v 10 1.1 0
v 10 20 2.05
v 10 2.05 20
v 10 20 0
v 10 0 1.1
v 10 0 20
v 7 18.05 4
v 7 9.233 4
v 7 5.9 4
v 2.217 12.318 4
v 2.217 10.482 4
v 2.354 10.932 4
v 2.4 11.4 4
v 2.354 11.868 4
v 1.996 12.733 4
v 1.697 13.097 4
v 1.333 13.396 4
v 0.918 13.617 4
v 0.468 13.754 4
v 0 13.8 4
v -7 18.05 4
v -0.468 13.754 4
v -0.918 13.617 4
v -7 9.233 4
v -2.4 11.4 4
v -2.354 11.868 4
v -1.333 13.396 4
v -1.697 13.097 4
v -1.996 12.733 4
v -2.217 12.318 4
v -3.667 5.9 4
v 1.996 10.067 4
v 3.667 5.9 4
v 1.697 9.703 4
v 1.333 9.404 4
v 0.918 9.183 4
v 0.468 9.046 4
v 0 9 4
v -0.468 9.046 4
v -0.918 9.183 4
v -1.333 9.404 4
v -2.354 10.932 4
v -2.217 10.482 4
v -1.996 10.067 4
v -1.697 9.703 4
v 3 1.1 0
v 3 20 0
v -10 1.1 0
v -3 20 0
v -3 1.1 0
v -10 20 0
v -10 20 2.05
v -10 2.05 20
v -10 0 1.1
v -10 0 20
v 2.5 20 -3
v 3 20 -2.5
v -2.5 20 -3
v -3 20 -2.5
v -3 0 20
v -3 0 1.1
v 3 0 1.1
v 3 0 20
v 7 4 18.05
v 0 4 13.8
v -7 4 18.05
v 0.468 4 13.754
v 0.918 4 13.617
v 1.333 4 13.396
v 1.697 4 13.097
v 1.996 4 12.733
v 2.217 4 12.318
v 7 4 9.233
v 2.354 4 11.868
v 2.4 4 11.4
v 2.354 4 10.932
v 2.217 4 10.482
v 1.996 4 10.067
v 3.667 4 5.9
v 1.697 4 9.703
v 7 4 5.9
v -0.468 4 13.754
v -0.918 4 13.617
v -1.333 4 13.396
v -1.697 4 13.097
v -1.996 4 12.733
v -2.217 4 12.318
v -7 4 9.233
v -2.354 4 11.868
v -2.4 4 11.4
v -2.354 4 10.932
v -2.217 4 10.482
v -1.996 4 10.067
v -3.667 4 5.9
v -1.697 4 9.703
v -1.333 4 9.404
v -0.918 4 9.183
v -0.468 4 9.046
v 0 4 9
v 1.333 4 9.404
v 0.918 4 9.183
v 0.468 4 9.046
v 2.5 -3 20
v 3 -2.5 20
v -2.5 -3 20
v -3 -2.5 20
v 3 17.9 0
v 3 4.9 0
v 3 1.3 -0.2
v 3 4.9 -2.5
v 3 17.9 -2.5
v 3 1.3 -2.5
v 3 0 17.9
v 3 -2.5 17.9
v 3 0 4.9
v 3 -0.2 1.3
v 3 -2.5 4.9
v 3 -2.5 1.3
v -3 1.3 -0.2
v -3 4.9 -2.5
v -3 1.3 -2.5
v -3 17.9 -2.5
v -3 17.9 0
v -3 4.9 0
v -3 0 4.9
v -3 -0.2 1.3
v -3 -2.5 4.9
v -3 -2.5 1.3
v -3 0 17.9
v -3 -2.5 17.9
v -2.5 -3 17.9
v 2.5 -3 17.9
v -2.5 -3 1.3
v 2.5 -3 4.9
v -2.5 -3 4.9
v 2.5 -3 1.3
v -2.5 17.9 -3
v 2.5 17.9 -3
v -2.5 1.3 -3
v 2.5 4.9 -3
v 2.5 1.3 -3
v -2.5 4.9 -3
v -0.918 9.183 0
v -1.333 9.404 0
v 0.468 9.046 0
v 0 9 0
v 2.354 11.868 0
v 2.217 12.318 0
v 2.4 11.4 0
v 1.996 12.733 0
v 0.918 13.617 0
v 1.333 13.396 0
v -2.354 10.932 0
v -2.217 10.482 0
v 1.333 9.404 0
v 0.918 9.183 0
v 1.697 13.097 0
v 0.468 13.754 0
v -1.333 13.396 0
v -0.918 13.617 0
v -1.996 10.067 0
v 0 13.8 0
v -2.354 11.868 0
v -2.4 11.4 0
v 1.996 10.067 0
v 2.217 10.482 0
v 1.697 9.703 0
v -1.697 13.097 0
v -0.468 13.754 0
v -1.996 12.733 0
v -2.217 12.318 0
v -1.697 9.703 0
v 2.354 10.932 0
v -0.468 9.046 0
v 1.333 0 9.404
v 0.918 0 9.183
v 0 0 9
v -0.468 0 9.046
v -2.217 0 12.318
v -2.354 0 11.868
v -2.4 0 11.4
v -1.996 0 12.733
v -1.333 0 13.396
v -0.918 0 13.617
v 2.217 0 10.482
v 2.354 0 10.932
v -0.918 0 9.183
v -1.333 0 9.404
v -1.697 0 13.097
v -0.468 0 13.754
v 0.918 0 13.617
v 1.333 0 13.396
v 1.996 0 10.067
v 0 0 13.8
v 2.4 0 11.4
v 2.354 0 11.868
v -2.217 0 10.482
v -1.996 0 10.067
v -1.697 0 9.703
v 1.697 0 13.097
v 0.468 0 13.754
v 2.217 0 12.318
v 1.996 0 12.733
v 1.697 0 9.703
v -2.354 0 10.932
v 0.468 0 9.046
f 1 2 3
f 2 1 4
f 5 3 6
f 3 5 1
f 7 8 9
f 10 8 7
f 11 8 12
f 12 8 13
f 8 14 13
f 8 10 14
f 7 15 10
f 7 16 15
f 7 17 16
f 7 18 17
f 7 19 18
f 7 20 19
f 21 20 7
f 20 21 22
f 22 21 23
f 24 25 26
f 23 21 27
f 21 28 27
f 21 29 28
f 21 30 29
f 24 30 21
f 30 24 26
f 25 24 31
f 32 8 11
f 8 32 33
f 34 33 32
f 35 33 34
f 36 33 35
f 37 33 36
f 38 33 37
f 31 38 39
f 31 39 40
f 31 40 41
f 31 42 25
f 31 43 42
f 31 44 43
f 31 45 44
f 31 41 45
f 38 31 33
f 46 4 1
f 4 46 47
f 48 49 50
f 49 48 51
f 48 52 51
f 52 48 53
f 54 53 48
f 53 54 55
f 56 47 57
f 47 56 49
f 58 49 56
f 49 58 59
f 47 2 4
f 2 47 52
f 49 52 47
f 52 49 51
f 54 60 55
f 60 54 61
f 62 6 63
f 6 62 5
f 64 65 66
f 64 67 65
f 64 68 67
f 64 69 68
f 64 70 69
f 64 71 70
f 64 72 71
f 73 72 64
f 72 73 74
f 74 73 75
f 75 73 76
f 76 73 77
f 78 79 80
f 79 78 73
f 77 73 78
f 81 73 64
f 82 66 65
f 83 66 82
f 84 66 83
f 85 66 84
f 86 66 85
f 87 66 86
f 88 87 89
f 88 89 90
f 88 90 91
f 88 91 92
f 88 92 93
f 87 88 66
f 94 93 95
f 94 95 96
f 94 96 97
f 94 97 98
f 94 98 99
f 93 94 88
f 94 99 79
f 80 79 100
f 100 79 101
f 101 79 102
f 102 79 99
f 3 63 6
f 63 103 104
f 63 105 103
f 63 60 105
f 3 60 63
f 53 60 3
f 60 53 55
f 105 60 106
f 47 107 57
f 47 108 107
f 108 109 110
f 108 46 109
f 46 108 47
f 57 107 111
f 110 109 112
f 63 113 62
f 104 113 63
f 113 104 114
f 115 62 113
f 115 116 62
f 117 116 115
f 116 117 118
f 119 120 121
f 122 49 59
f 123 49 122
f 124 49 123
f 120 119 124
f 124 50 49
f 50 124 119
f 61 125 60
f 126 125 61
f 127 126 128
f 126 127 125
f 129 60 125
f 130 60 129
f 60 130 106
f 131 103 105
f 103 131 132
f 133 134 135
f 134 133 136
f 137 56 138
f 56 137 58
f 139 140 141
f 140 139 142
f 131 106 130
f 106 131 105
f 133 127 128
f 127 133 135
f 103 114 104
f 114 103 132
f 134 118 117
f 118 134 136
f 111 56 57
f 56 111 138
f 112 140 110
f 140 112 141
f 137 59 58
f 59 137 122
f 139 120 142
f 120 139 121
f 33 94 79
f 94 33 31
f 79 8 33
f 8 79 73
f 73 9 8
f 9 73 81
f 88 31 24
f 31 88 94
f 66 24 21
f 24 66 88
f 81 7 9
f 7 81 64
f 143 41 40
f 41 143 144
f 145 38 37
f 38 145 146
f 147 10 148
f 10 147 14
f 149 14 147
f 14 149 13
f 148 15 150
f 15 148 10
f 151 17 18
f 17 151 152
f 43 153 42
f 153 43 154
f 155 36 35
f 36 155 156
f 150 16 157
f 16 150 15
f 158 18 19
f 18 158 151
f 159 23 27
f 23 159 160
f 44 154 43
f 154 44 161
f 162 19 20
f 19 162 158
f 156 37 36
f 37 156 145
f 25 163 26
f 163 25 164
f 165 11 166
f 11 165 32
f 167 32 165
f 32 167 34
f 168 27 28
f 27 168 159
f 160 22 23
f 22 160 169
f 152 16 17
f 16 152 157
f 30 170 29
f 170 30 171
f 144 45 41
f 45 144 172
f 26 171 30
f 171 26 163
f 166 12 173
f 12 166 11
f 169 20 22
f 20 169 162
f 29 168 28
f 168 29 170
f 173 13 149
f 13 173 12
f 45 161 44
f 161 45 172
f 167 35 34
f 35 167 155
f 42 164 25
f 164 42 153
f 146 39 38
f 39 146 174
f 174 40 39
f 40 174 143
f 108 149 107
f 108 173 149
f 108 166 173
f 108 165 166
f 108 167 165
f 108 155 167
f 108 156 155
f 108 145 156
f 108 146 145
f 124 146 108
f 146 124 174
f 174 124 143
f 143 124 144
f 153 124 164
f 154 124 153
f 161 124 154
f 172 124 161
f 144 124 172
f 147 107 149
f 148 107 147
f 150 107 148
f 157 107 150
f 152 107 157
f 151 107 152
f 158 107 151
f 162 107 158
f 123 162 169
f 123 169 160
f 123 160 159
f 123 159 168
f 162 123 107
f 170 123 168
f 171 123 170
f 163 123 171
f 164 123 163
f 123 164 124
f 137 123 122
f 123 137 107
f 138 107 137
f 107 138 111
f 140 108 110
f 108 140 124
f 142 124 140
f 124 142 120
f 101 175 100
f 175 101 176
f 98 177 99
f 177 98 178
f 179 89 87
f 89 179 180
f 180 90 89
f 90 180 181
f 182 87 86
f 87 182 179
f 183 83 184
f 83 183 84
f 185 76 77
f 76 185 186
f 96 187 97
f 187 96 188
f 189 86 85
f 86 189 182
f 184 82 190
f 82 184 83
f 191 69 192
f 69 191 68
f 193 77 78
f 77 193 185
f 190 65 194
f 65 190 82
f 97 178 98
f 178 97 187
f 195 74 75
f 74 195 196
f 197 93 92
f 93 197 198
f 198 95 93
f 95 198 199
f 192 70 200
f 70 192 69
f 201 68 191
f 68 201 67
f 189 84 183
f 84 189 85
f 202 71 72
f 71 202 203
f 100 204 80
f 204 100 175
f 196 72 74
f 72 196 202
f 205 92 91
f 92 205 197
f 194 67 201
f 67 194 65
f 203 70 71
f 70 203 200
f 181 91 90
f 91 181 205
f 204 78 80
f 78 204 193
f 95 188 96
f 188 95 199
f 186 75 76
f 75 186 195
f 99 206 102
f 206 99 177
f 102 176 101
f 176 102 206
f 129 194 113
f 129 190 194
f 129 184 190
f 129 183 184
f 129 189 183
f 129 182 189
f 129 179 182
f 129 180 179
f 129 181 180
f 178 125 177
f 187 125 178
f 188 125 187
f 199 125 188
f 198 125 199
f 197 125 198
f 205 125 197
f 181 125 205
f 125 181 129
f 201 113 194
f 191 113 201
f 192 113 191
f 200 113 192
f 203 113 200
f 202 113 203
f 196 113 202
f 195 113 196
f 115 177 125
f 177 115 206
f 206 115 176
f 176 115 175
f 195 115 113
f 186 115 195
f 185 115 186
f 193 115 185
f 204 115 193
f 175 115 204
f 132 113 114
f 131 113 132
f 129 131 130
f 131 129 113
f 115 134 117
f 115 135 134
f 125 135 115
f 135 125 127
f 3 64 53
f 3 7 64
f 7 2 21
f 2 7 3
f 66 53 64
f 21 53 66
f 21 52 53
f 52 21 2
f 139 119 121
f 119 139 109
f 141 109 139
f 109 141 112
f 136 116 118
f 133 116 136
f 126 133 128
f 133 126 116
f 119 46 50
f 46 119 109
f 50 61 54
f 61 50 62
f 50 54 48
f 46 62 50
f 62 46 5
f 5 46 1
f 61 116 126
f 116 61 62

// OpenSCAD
/*
* Ultimate Customizable Corner Brackets
* https://www.thingiverse.com/thing:3007147
* By Daniel Hultgren https://www.thingiverse.com/Hultis
* Version 1.4
* 2020-06-08
*/

/* [Basic settings] */

// The width of your aluminium extrusion.
extrusion_width = 20;
// The side length of the bracket.
side_length = 20;
// The thickness of the wall facing the extrusion.
side_thickness = 4;
// How many screw holes are are on the top side.
top_screw_count = 1;
// How many screw holes are are on the bottom side.
bottom_screw_count = 1;
// Screw diameter (4 for M4, 5 for M5 and so on).
screw_hole_size = 4;
// Screw head diameter.
screw_head_size = 10;


/* [Advanced settings] */

// How deep screw heads should be recessed. Obviously don't make this larger than side_thickness.
recessed_screw_depth = 0;
// How much to elongate the holes on top.
top_screw_elongation = 0;
// How much to elongate the holes on bottom.
bottom_screw_elongation = 0;
// The part which goes into your extrusion. Generally this should be slightly smaller than the actual hole, but YMMV.
extrusion_insert_width = 6;
// Use this when you want multiple connected brackets, for 4020 and similar. 20 for 2020 extrusions, 30 for 3030 and so on.
extrusion_base = 20;
// Set how many walls you want. One wall doesn't play well with multiple bracket mode.
wall_count = 2; // [0 : 1 : 2]
// Set lower if you think the side walls are too thick.
max_wall_thickness = 3;
// Set this if you want to use these above your existing brackets. Typical 2020 brackets have a size of 20 and side thickness of 3.
cutout_size = 1;
cutout_side_thickness = -0.5;
// Decrease this if you don't want extrusion inserts on both sides. Intended for using these entirely or partially on non-extrusions.
extrusion_insert_count = 2; // [0 : 1 : 2]
// Set this to control how much space the nuts have. Hammer nuts should just work but for t nuts you will need to set a specific width.
specific_bottom_nut_space = 13;
// Bracket angle for all your non-90 degree needs.
bracket_angle = 90; // [45 : 1 : 180]





/**********************************
   End of config, here be dragons
**********************************/





/* [Hidden] */
// preview[view:north east, tilt:top diagonal]

// How far into the extrusions the inserts go. Should be fine as it is.
extrusion_insert_height = 3;

cutout_margin = 0.3;
screw_head_margin = 0.5;
e = 0.05;
top_screw_distance = screw_distance_from_edge(side_length, side_thickness, top_screw_count, screw_hole_size, screw_head_size, screw_head_margin, top_screw_elongation, cutout_size);
bottom_screw_distance = screw_distance_from_edge(side_length, side_thickness, bottom_screw_count, screw_hole_size, screw_head_size, screw_head_margin, top_screw_elongation, cutout_size);
screw_distance_from_edge = max(top_screw_distance, bottom_screw_distance);

bridge_size = min(
    bridge(side_length, side_thickness, top_screw_count, screw_head_margin, top_screw_elongation+screw_head_size, top_screw_distance, cutout_size),
    bridge(side_length, side_thickness, bottom_screw_count, screw_head_margin, bottom_screw_elongation+screw_head_size, bottom_screw_distance, cutout_size));

main();

module main() {
    bracket_count = round(extrusion_width / extrusion_base);
    extrusion_width = extrusion_width/bracket_count;
    wall_thickness = min([max_wall_thickness, (extrusion_width - screw_head_size - screw_head_margin) / 2]);
    union() {
        for(i=[0:bracket_count-1]) {
            translate([i*extrusion_width, 0, 0]) bracket(extrusion_width, wall_thickness);
        }
    }
}

module bracket_sides(width) {
    difference() {
        union() {
            translate([-width/2, 0, 0]) cube([width, side_length, side_thickness]); // Bottom wall
            rotate([bracket_angle, 0, 0]) translate([-width/2, 0, -side_thickness]) cube([width, side_length, side_thickness]); // Top wall
        }
        if (bracket_angle < 90) {
            translate([-width/2-e, 0, -side_thickness]) cube([width+2*e, side_length, side_thickness]); // Bottom wall cutoff
            rotate([bracket_angle, 0, 0]) translate([-width/2-e, 0, 0]) cube([width+2*e, side_length, side_thickness]); // Top wall cutoff
        }
    }
}

module bracket(width, wall_thickness, is_first) {
    difference() {
        union() {
            bracket_sides(width);
            if (wall_count >= 1) {
                translate([width/2 - wall_thickness, 0, 0]) rotate([90, 0, 90]) wall(width, side_length, wall_thickness); // Left wall
            }
            if (wall_count >= 2) {
                translate([-width/2, 0, 0]) rotate([90, 0, 90]) wall(width, side_length, wall_thickness); // Right wall
            }
            
            // Make the parts which go into the extrusions, with chamfers
            if (extrusion_insert_count > 0) difference() {
                union() {
                    if (extrusion_insert_count > 0) {
                        translate([0, 0, 0]) rotate([90, 0, 180]) extrusion_insert();
                    }
                    if (extrusion_insert_count > 1) {
                        rotate([bracket_angle-90,0,0]) extrusion_insert();
                        extrusion_insert_corner();
                    }
                    
                }
                // Make chamfers
                rotate([bracket_angle-90,0,0]) extrusion_chamfer();
                translate([0, 0, 0]) rotate([90, 0, 180]) extrusion_chamfer();
            }
            bridge(bridge_size, width, wall_thickness);
        };

        // Cutoff for easier printing
        cutoff_amount = 0.5*(180-bracket_angle)/90 * side_thickness;
        magic_height_number = 42;
        translate([0, side_length+e, side_thickness-cutoff_amount])
            rotate([90-(180-bracket_angle)/2, 0, 0])
            linear_extrude(height=(side_length+e)*2, convexity=2)
            polygon(points = [
                [width/2+e, 0],
                [-width/2-e, 0],
                [-width/2-e, magic_height_number],
                [width/2+e, magic_height_number]
            ]);
        
        // Make screw holes
        side_screw_holes(bottom_screw_count, bottom_screw_distance, bottom_screw_elongation); // Bottom screws
        rotate([bracket_angle-90,0,0]) {
            rotate([270, 180, 0]) side_screw_holes(top_screw_count, top_screw_distance, top_screw_elongation); // Top screws
        }
        cutout();
    }
}

module side_screw_holes(screw_count, screw_distance_from_edge, screw_elongation, screw_distance) {
    screw_total_distance = side_length - screw_distance_from_edge - bridge_size - side_thickness - screw_head_size/2 - screw_head_margin - screw_elongation/2;
    screw_distance = screw_total_distance/(max(1, screw_count-1));
    for(i=[0:screw_count-1]) {
        translate([0, side_length - screw_distance_from_edge - i*screw_distance, -e]) screw(screw_hole_size, screw_head_size, screw_elongation);
    }
}

module cutout() {
    zero = -e-extrusion_insert_height;
    full_width = cutout_size+cutout_margin;
    if (cutout_size > 0) {
        assert(bracket_angle == 90, "Can't use cutout with bracket angles other than 90 degrees");
        translate([extrusion_width/2+e, 0, 0])
            rotate([0, -90, 0])
            linear_extrude(height = extrusion_width+2*e, convexity = 2)
            polygon(points = [
            [zero, zero],
            [zero, full_width],
            [cutout_side_thickness+cutout_margin, full_width],
            [full_width, cutout_side_thickness+cutout_margin],
            [full_width, zero]]);
    }
}

module wall(w, l, wall_thickness) {
    linear_extrude(height = wall_thickness, convexity = 2)
        polygon(points = [[side_thickness*tan((180-bracket_angle)/2), side_thickness],
                          [side_length, side_thickness],
                          [-side_length*sin(bracket_angle-90)+side_thickness*cos(bracket_angle-90), side_length*cos(bracket_angle-90)+side_thickness*sin(bracket_angle-90)]]);
    }

module screw(hole_size, head_size, screw_elongation = 0) {
    if (screw_elongation > 0) {
        translate([0,screw_elongation/2,-0.5]) cylinder(h = side_thickness + 1, r = hole_size / 2 + 0.4, $fn = 32); // Screw hole
        translate([-hole_size/2-0.4,-screw_elongation/2,-0.5]) cube([hole_size + 0.8, screw_elongation, side_thickness + 1]); // Hole mid part
        translate([0,-screw_elongation/2,-0.5]) cylinder(h = side_thickness + 1, r = hole_size / 2 + 0.4, $fn = 32); // Screw hole
    } else {
        translate([0,0,-0.5]) cylinder(h = side_thickness + 1, r = hole_size / 2 + 0.4, $fn = 32); // Screw hole
    }
    if(recessed_screw_depth > 0) {
        assert(screw_elongation == 0, "Can't use recessed screws with elongated screws");
        translate([0, 0, side_thickness - recessed_screw_depth]) cylinder(h = recessed_screw_depth+1, r = (head_size + screw_head_margin)/2, $fn = 32);
    }
    bottom_nut_space = specific_bottom_nut_space > 0
        ? specific_bottom_nut_space
        : max(screw_hole_size*2+1, screw_hole_size+screw_elongation+1); // This works for typical hammer nuts
    translate([-extrusion_insert_width/2-e, -bottom_nut_space/2, -extrusion_insert_height-e]) cube([extrusion_insert_width + 2*e, bottom_nut_space,extrusion_insert_height+2*e]); // Remove extrusion insert below screw
    translate([0, 0, side_thickness+2*e]) display_screw_head(head_size, screw_elongation);
}

module display_screw_head(head_size, screw_elongation) {
    // Screw head, to make sure they don't hit each other
    #hull() {
        translate([0, screw_elongation/2, 0]) cylinder(h = 3, r = head_size / 2, $fn = 32);
        translate([0, -screw_elongation/2, 0]) cylinder(h = 3, r = head_size / 2, $fn = 32);
    }
}

module bridge(size, width, wall_thickness) {
    c = screw_head_size / 3;
    union() {
        translate([width/2, 0, 0])
            rotate([0, 270, 0])
            linear_extrude(height = width, convexity = 2)
             polygon([[side_thickness, side_thickness*tan((180-bracket_angle)/2)],
                       [(side_thickness+size)*cos(bracket_angle-90)+side_thickness*sin(bracket_angle-90), -(side_thickness+size)*sin(bracket_angle-90)+side_thickness*cos(bracket_angle-90)],
                       [side_thickness, side_thickness + size]]); // Main bridge
        if (wall_count >= 1) {
            translate([width/2-wall_thickness-c, 0, 0]) bridge_side(size, [[0, 0], [c, 0], [c, c]]); // Left
        }
        if (wall_count >= 2) {
            translate([-width/2+wall_thickness, 0, 0]) bridge_side(size, [[0, 0], [c, 0], [0, c]]); // Right
        }
    }
}

module bridge_side(size, polygon_points){
    hull() {
        translate([0, size+side_thickness, side_thickness-e]) linear_extrude(height = e, convexity = 2) polygon(points = polygon_points);
        translate([0, -(side_thickness+size)*sin(bracket_angle-90)+side_thickness*cos(bracket_angle-90), (side_thickness+size)*cos(bracket_angle-90)+side_thickness*sin(bracket_angle-90)])
            rotate([bracket_angle,0,0])
                linear_extrude(height = e, convexity = 2)
                    polygon(points = polygon_points);
    }
}

module extrusion_insert() {
    translate([-extrusion_insert_width/2, -extrusion_insert_height, 0]) cube([extrusion_insert_width, extrusion_insert_height, side_length]);
}

module extrusion_chamfer(height = .5) {
    added_length_for_low_angles = extrusion_insert_height;
    x = extrusion_insert_width;
    z = side_length + extrusion_insert_height + added_length_for_low_angles;
    length = sqrt(height * height * 2);
    translate([-extrusion_insert_width/2, -extrusion_insert_height, -extrusion_insert_height]) union() {
        translate([0, -height, -added_length_for_low_angles-e]) rotate([0, 0, 45]) cube([length, length, z+2*e]);
        translate([x, -height, -added_length_for_low_angles-e]) rotate([0, 0, 45]) cube([length, length, z+2*e]);
    }
}
module extrusion_insert_corner() {
    difference() {
        translate([extrusion_insert_width/2,0,-extrusion_insert_height])
            rotate([90,0,-90])
            linear_extrude(extrusion_insert_width, center = false, convexity = 10, twist = 0)
                polygon(points=[[0,0],
                               [0,extrusion_insert_height],
                               [extrusion_insert_height*cos(bracket_angle-90),(extrusion_insert_height-extrusion_insert_height*sin(bracket_angle-90))],
                               [extrusion_insert_height*tan((180-bracket_angle)/2),0]]);
        if (bracket_angle < 90) {
            rotate([bracket_angle/2+90, 0, 0]) translate([-extrusion_insert_width/2-e, -extrusion_insert_height, sqrt(2)*extrusion_insert_height]) cube([extrusion_insert_width+2*e, extrusion_insert_height*2, 20]);
        }
    }
}

function screw_distance_from_edge(side_length, side_thickness, screw_count, screw_hole_size, screw_head_size, screw_head_margin, screw_elongation, cutout_size) =
    let(screw_head_height = 3,
    screw_required_length = screw_elongation+screw_head_size,
    usable_side = side_length-side_thickness*(cutout_size > 0 ? 0.5 : 1.5)-cutout_size-screw_required_length*screw_count,
    min_screw_distance = side_thickness*0.5+screw_required_length/2)
    screw_count > 1
        ? min_screw_distance
        : (usable_side-screw_head_height)*0.4+min_screw_distance;

function bridge(side_length, side_thickness, screw_count, screw_head_margin, total_screw_size, screw_distance_from_edge, cutout_size) =
    let(max_possible_bridge = side_length-side_thickness-screw_distance_from_edge-total_screw_size*screw_count-cutout_size)
    screw_count > 1
        ? max(max_possible_bridge/screw_count+cutout_size, 0)
        : side_length - screw_distance_from_edge - total_screw_size / 2 - side_thickness - screw_head_margin;





/**********************************
       Unit tests start here
**********************************/

//unit_tests();
module unit_tests() {
    screw_distance_from_edge_tests();
    bridge_size_tests();
}

module screw_distance_from_edge_tests() {
    // basic 30mm side
    assert_with_message(screw_distance_from_edge(30, 5, 1, 5, 10, 0.5, 0, 0), 11.3);
    // basic 40mm side
    assert_with_message(screw_distance_from_edge(40, 5, 1, 5, 10, 0.5, 0, 0), 15.3);
    // thicker sides
    assert_with_message(screw_distance_from_edge(30, 10, 1, 5, 10, 0.5, 0, 0), 10.8);
    // elongated screw holes
    assert_with_message(screw_distance_from_edge(30, 5, 1, 5, 10, 0.5, 15, 0), 12.8);
    // cutout
    assert_with_message(screw_distance_from_edge(40, 5, 1, 5, 10, 0.5, 0, 20), 9.3);

    // basic two screws
    assert_with_message(screw_distance_from_edge(30, 5, 2, 5, 10, 0.5, 0, 0), 7.5);
    // thicker sides
    assert_with_message(screw_distance_from_edge(50, 10, 2, 5, 10, 0.5, 0, 0), 10);
    // two screws with cutout
    assert_with_message(screw_distance_from_edge(50, 5, 2, 5, 10, 0.5, 0, 10), 7.5);
    // two elongated screws
    assert_with_message(screw_distance_from_edge(50, 5, 2, 5, 10, 0.5, 10, 0), 12.5);
}

module bridge_size_tests() {
    // one screw on basic bracket
    assert_with_message(bridge(30, 5, 1, 0.5, 10, 8, 0), 11.5);
    // single screw with cutout
    assert_with_message(bridge(40, 5, 1, 0.5, 10, 8, 20), 21.5);
    // two screws with cutout
    assert_with_message(bridge(50, 5, 2, 0.5, 10, 8, 20), 18.5);
    // three screws on long bracket
    assert_with_message(bridge(80, 8, 3, 0.5, 10, 12, 0), 10);
}

module assert_with_message(actual, expected) {
    allowed_error = 0.0001;
    if (abs(actual-expected) > allowed_error) {
        assert(expected == actual, str("Expected ", expected, " but got ", actual));
    }
}
